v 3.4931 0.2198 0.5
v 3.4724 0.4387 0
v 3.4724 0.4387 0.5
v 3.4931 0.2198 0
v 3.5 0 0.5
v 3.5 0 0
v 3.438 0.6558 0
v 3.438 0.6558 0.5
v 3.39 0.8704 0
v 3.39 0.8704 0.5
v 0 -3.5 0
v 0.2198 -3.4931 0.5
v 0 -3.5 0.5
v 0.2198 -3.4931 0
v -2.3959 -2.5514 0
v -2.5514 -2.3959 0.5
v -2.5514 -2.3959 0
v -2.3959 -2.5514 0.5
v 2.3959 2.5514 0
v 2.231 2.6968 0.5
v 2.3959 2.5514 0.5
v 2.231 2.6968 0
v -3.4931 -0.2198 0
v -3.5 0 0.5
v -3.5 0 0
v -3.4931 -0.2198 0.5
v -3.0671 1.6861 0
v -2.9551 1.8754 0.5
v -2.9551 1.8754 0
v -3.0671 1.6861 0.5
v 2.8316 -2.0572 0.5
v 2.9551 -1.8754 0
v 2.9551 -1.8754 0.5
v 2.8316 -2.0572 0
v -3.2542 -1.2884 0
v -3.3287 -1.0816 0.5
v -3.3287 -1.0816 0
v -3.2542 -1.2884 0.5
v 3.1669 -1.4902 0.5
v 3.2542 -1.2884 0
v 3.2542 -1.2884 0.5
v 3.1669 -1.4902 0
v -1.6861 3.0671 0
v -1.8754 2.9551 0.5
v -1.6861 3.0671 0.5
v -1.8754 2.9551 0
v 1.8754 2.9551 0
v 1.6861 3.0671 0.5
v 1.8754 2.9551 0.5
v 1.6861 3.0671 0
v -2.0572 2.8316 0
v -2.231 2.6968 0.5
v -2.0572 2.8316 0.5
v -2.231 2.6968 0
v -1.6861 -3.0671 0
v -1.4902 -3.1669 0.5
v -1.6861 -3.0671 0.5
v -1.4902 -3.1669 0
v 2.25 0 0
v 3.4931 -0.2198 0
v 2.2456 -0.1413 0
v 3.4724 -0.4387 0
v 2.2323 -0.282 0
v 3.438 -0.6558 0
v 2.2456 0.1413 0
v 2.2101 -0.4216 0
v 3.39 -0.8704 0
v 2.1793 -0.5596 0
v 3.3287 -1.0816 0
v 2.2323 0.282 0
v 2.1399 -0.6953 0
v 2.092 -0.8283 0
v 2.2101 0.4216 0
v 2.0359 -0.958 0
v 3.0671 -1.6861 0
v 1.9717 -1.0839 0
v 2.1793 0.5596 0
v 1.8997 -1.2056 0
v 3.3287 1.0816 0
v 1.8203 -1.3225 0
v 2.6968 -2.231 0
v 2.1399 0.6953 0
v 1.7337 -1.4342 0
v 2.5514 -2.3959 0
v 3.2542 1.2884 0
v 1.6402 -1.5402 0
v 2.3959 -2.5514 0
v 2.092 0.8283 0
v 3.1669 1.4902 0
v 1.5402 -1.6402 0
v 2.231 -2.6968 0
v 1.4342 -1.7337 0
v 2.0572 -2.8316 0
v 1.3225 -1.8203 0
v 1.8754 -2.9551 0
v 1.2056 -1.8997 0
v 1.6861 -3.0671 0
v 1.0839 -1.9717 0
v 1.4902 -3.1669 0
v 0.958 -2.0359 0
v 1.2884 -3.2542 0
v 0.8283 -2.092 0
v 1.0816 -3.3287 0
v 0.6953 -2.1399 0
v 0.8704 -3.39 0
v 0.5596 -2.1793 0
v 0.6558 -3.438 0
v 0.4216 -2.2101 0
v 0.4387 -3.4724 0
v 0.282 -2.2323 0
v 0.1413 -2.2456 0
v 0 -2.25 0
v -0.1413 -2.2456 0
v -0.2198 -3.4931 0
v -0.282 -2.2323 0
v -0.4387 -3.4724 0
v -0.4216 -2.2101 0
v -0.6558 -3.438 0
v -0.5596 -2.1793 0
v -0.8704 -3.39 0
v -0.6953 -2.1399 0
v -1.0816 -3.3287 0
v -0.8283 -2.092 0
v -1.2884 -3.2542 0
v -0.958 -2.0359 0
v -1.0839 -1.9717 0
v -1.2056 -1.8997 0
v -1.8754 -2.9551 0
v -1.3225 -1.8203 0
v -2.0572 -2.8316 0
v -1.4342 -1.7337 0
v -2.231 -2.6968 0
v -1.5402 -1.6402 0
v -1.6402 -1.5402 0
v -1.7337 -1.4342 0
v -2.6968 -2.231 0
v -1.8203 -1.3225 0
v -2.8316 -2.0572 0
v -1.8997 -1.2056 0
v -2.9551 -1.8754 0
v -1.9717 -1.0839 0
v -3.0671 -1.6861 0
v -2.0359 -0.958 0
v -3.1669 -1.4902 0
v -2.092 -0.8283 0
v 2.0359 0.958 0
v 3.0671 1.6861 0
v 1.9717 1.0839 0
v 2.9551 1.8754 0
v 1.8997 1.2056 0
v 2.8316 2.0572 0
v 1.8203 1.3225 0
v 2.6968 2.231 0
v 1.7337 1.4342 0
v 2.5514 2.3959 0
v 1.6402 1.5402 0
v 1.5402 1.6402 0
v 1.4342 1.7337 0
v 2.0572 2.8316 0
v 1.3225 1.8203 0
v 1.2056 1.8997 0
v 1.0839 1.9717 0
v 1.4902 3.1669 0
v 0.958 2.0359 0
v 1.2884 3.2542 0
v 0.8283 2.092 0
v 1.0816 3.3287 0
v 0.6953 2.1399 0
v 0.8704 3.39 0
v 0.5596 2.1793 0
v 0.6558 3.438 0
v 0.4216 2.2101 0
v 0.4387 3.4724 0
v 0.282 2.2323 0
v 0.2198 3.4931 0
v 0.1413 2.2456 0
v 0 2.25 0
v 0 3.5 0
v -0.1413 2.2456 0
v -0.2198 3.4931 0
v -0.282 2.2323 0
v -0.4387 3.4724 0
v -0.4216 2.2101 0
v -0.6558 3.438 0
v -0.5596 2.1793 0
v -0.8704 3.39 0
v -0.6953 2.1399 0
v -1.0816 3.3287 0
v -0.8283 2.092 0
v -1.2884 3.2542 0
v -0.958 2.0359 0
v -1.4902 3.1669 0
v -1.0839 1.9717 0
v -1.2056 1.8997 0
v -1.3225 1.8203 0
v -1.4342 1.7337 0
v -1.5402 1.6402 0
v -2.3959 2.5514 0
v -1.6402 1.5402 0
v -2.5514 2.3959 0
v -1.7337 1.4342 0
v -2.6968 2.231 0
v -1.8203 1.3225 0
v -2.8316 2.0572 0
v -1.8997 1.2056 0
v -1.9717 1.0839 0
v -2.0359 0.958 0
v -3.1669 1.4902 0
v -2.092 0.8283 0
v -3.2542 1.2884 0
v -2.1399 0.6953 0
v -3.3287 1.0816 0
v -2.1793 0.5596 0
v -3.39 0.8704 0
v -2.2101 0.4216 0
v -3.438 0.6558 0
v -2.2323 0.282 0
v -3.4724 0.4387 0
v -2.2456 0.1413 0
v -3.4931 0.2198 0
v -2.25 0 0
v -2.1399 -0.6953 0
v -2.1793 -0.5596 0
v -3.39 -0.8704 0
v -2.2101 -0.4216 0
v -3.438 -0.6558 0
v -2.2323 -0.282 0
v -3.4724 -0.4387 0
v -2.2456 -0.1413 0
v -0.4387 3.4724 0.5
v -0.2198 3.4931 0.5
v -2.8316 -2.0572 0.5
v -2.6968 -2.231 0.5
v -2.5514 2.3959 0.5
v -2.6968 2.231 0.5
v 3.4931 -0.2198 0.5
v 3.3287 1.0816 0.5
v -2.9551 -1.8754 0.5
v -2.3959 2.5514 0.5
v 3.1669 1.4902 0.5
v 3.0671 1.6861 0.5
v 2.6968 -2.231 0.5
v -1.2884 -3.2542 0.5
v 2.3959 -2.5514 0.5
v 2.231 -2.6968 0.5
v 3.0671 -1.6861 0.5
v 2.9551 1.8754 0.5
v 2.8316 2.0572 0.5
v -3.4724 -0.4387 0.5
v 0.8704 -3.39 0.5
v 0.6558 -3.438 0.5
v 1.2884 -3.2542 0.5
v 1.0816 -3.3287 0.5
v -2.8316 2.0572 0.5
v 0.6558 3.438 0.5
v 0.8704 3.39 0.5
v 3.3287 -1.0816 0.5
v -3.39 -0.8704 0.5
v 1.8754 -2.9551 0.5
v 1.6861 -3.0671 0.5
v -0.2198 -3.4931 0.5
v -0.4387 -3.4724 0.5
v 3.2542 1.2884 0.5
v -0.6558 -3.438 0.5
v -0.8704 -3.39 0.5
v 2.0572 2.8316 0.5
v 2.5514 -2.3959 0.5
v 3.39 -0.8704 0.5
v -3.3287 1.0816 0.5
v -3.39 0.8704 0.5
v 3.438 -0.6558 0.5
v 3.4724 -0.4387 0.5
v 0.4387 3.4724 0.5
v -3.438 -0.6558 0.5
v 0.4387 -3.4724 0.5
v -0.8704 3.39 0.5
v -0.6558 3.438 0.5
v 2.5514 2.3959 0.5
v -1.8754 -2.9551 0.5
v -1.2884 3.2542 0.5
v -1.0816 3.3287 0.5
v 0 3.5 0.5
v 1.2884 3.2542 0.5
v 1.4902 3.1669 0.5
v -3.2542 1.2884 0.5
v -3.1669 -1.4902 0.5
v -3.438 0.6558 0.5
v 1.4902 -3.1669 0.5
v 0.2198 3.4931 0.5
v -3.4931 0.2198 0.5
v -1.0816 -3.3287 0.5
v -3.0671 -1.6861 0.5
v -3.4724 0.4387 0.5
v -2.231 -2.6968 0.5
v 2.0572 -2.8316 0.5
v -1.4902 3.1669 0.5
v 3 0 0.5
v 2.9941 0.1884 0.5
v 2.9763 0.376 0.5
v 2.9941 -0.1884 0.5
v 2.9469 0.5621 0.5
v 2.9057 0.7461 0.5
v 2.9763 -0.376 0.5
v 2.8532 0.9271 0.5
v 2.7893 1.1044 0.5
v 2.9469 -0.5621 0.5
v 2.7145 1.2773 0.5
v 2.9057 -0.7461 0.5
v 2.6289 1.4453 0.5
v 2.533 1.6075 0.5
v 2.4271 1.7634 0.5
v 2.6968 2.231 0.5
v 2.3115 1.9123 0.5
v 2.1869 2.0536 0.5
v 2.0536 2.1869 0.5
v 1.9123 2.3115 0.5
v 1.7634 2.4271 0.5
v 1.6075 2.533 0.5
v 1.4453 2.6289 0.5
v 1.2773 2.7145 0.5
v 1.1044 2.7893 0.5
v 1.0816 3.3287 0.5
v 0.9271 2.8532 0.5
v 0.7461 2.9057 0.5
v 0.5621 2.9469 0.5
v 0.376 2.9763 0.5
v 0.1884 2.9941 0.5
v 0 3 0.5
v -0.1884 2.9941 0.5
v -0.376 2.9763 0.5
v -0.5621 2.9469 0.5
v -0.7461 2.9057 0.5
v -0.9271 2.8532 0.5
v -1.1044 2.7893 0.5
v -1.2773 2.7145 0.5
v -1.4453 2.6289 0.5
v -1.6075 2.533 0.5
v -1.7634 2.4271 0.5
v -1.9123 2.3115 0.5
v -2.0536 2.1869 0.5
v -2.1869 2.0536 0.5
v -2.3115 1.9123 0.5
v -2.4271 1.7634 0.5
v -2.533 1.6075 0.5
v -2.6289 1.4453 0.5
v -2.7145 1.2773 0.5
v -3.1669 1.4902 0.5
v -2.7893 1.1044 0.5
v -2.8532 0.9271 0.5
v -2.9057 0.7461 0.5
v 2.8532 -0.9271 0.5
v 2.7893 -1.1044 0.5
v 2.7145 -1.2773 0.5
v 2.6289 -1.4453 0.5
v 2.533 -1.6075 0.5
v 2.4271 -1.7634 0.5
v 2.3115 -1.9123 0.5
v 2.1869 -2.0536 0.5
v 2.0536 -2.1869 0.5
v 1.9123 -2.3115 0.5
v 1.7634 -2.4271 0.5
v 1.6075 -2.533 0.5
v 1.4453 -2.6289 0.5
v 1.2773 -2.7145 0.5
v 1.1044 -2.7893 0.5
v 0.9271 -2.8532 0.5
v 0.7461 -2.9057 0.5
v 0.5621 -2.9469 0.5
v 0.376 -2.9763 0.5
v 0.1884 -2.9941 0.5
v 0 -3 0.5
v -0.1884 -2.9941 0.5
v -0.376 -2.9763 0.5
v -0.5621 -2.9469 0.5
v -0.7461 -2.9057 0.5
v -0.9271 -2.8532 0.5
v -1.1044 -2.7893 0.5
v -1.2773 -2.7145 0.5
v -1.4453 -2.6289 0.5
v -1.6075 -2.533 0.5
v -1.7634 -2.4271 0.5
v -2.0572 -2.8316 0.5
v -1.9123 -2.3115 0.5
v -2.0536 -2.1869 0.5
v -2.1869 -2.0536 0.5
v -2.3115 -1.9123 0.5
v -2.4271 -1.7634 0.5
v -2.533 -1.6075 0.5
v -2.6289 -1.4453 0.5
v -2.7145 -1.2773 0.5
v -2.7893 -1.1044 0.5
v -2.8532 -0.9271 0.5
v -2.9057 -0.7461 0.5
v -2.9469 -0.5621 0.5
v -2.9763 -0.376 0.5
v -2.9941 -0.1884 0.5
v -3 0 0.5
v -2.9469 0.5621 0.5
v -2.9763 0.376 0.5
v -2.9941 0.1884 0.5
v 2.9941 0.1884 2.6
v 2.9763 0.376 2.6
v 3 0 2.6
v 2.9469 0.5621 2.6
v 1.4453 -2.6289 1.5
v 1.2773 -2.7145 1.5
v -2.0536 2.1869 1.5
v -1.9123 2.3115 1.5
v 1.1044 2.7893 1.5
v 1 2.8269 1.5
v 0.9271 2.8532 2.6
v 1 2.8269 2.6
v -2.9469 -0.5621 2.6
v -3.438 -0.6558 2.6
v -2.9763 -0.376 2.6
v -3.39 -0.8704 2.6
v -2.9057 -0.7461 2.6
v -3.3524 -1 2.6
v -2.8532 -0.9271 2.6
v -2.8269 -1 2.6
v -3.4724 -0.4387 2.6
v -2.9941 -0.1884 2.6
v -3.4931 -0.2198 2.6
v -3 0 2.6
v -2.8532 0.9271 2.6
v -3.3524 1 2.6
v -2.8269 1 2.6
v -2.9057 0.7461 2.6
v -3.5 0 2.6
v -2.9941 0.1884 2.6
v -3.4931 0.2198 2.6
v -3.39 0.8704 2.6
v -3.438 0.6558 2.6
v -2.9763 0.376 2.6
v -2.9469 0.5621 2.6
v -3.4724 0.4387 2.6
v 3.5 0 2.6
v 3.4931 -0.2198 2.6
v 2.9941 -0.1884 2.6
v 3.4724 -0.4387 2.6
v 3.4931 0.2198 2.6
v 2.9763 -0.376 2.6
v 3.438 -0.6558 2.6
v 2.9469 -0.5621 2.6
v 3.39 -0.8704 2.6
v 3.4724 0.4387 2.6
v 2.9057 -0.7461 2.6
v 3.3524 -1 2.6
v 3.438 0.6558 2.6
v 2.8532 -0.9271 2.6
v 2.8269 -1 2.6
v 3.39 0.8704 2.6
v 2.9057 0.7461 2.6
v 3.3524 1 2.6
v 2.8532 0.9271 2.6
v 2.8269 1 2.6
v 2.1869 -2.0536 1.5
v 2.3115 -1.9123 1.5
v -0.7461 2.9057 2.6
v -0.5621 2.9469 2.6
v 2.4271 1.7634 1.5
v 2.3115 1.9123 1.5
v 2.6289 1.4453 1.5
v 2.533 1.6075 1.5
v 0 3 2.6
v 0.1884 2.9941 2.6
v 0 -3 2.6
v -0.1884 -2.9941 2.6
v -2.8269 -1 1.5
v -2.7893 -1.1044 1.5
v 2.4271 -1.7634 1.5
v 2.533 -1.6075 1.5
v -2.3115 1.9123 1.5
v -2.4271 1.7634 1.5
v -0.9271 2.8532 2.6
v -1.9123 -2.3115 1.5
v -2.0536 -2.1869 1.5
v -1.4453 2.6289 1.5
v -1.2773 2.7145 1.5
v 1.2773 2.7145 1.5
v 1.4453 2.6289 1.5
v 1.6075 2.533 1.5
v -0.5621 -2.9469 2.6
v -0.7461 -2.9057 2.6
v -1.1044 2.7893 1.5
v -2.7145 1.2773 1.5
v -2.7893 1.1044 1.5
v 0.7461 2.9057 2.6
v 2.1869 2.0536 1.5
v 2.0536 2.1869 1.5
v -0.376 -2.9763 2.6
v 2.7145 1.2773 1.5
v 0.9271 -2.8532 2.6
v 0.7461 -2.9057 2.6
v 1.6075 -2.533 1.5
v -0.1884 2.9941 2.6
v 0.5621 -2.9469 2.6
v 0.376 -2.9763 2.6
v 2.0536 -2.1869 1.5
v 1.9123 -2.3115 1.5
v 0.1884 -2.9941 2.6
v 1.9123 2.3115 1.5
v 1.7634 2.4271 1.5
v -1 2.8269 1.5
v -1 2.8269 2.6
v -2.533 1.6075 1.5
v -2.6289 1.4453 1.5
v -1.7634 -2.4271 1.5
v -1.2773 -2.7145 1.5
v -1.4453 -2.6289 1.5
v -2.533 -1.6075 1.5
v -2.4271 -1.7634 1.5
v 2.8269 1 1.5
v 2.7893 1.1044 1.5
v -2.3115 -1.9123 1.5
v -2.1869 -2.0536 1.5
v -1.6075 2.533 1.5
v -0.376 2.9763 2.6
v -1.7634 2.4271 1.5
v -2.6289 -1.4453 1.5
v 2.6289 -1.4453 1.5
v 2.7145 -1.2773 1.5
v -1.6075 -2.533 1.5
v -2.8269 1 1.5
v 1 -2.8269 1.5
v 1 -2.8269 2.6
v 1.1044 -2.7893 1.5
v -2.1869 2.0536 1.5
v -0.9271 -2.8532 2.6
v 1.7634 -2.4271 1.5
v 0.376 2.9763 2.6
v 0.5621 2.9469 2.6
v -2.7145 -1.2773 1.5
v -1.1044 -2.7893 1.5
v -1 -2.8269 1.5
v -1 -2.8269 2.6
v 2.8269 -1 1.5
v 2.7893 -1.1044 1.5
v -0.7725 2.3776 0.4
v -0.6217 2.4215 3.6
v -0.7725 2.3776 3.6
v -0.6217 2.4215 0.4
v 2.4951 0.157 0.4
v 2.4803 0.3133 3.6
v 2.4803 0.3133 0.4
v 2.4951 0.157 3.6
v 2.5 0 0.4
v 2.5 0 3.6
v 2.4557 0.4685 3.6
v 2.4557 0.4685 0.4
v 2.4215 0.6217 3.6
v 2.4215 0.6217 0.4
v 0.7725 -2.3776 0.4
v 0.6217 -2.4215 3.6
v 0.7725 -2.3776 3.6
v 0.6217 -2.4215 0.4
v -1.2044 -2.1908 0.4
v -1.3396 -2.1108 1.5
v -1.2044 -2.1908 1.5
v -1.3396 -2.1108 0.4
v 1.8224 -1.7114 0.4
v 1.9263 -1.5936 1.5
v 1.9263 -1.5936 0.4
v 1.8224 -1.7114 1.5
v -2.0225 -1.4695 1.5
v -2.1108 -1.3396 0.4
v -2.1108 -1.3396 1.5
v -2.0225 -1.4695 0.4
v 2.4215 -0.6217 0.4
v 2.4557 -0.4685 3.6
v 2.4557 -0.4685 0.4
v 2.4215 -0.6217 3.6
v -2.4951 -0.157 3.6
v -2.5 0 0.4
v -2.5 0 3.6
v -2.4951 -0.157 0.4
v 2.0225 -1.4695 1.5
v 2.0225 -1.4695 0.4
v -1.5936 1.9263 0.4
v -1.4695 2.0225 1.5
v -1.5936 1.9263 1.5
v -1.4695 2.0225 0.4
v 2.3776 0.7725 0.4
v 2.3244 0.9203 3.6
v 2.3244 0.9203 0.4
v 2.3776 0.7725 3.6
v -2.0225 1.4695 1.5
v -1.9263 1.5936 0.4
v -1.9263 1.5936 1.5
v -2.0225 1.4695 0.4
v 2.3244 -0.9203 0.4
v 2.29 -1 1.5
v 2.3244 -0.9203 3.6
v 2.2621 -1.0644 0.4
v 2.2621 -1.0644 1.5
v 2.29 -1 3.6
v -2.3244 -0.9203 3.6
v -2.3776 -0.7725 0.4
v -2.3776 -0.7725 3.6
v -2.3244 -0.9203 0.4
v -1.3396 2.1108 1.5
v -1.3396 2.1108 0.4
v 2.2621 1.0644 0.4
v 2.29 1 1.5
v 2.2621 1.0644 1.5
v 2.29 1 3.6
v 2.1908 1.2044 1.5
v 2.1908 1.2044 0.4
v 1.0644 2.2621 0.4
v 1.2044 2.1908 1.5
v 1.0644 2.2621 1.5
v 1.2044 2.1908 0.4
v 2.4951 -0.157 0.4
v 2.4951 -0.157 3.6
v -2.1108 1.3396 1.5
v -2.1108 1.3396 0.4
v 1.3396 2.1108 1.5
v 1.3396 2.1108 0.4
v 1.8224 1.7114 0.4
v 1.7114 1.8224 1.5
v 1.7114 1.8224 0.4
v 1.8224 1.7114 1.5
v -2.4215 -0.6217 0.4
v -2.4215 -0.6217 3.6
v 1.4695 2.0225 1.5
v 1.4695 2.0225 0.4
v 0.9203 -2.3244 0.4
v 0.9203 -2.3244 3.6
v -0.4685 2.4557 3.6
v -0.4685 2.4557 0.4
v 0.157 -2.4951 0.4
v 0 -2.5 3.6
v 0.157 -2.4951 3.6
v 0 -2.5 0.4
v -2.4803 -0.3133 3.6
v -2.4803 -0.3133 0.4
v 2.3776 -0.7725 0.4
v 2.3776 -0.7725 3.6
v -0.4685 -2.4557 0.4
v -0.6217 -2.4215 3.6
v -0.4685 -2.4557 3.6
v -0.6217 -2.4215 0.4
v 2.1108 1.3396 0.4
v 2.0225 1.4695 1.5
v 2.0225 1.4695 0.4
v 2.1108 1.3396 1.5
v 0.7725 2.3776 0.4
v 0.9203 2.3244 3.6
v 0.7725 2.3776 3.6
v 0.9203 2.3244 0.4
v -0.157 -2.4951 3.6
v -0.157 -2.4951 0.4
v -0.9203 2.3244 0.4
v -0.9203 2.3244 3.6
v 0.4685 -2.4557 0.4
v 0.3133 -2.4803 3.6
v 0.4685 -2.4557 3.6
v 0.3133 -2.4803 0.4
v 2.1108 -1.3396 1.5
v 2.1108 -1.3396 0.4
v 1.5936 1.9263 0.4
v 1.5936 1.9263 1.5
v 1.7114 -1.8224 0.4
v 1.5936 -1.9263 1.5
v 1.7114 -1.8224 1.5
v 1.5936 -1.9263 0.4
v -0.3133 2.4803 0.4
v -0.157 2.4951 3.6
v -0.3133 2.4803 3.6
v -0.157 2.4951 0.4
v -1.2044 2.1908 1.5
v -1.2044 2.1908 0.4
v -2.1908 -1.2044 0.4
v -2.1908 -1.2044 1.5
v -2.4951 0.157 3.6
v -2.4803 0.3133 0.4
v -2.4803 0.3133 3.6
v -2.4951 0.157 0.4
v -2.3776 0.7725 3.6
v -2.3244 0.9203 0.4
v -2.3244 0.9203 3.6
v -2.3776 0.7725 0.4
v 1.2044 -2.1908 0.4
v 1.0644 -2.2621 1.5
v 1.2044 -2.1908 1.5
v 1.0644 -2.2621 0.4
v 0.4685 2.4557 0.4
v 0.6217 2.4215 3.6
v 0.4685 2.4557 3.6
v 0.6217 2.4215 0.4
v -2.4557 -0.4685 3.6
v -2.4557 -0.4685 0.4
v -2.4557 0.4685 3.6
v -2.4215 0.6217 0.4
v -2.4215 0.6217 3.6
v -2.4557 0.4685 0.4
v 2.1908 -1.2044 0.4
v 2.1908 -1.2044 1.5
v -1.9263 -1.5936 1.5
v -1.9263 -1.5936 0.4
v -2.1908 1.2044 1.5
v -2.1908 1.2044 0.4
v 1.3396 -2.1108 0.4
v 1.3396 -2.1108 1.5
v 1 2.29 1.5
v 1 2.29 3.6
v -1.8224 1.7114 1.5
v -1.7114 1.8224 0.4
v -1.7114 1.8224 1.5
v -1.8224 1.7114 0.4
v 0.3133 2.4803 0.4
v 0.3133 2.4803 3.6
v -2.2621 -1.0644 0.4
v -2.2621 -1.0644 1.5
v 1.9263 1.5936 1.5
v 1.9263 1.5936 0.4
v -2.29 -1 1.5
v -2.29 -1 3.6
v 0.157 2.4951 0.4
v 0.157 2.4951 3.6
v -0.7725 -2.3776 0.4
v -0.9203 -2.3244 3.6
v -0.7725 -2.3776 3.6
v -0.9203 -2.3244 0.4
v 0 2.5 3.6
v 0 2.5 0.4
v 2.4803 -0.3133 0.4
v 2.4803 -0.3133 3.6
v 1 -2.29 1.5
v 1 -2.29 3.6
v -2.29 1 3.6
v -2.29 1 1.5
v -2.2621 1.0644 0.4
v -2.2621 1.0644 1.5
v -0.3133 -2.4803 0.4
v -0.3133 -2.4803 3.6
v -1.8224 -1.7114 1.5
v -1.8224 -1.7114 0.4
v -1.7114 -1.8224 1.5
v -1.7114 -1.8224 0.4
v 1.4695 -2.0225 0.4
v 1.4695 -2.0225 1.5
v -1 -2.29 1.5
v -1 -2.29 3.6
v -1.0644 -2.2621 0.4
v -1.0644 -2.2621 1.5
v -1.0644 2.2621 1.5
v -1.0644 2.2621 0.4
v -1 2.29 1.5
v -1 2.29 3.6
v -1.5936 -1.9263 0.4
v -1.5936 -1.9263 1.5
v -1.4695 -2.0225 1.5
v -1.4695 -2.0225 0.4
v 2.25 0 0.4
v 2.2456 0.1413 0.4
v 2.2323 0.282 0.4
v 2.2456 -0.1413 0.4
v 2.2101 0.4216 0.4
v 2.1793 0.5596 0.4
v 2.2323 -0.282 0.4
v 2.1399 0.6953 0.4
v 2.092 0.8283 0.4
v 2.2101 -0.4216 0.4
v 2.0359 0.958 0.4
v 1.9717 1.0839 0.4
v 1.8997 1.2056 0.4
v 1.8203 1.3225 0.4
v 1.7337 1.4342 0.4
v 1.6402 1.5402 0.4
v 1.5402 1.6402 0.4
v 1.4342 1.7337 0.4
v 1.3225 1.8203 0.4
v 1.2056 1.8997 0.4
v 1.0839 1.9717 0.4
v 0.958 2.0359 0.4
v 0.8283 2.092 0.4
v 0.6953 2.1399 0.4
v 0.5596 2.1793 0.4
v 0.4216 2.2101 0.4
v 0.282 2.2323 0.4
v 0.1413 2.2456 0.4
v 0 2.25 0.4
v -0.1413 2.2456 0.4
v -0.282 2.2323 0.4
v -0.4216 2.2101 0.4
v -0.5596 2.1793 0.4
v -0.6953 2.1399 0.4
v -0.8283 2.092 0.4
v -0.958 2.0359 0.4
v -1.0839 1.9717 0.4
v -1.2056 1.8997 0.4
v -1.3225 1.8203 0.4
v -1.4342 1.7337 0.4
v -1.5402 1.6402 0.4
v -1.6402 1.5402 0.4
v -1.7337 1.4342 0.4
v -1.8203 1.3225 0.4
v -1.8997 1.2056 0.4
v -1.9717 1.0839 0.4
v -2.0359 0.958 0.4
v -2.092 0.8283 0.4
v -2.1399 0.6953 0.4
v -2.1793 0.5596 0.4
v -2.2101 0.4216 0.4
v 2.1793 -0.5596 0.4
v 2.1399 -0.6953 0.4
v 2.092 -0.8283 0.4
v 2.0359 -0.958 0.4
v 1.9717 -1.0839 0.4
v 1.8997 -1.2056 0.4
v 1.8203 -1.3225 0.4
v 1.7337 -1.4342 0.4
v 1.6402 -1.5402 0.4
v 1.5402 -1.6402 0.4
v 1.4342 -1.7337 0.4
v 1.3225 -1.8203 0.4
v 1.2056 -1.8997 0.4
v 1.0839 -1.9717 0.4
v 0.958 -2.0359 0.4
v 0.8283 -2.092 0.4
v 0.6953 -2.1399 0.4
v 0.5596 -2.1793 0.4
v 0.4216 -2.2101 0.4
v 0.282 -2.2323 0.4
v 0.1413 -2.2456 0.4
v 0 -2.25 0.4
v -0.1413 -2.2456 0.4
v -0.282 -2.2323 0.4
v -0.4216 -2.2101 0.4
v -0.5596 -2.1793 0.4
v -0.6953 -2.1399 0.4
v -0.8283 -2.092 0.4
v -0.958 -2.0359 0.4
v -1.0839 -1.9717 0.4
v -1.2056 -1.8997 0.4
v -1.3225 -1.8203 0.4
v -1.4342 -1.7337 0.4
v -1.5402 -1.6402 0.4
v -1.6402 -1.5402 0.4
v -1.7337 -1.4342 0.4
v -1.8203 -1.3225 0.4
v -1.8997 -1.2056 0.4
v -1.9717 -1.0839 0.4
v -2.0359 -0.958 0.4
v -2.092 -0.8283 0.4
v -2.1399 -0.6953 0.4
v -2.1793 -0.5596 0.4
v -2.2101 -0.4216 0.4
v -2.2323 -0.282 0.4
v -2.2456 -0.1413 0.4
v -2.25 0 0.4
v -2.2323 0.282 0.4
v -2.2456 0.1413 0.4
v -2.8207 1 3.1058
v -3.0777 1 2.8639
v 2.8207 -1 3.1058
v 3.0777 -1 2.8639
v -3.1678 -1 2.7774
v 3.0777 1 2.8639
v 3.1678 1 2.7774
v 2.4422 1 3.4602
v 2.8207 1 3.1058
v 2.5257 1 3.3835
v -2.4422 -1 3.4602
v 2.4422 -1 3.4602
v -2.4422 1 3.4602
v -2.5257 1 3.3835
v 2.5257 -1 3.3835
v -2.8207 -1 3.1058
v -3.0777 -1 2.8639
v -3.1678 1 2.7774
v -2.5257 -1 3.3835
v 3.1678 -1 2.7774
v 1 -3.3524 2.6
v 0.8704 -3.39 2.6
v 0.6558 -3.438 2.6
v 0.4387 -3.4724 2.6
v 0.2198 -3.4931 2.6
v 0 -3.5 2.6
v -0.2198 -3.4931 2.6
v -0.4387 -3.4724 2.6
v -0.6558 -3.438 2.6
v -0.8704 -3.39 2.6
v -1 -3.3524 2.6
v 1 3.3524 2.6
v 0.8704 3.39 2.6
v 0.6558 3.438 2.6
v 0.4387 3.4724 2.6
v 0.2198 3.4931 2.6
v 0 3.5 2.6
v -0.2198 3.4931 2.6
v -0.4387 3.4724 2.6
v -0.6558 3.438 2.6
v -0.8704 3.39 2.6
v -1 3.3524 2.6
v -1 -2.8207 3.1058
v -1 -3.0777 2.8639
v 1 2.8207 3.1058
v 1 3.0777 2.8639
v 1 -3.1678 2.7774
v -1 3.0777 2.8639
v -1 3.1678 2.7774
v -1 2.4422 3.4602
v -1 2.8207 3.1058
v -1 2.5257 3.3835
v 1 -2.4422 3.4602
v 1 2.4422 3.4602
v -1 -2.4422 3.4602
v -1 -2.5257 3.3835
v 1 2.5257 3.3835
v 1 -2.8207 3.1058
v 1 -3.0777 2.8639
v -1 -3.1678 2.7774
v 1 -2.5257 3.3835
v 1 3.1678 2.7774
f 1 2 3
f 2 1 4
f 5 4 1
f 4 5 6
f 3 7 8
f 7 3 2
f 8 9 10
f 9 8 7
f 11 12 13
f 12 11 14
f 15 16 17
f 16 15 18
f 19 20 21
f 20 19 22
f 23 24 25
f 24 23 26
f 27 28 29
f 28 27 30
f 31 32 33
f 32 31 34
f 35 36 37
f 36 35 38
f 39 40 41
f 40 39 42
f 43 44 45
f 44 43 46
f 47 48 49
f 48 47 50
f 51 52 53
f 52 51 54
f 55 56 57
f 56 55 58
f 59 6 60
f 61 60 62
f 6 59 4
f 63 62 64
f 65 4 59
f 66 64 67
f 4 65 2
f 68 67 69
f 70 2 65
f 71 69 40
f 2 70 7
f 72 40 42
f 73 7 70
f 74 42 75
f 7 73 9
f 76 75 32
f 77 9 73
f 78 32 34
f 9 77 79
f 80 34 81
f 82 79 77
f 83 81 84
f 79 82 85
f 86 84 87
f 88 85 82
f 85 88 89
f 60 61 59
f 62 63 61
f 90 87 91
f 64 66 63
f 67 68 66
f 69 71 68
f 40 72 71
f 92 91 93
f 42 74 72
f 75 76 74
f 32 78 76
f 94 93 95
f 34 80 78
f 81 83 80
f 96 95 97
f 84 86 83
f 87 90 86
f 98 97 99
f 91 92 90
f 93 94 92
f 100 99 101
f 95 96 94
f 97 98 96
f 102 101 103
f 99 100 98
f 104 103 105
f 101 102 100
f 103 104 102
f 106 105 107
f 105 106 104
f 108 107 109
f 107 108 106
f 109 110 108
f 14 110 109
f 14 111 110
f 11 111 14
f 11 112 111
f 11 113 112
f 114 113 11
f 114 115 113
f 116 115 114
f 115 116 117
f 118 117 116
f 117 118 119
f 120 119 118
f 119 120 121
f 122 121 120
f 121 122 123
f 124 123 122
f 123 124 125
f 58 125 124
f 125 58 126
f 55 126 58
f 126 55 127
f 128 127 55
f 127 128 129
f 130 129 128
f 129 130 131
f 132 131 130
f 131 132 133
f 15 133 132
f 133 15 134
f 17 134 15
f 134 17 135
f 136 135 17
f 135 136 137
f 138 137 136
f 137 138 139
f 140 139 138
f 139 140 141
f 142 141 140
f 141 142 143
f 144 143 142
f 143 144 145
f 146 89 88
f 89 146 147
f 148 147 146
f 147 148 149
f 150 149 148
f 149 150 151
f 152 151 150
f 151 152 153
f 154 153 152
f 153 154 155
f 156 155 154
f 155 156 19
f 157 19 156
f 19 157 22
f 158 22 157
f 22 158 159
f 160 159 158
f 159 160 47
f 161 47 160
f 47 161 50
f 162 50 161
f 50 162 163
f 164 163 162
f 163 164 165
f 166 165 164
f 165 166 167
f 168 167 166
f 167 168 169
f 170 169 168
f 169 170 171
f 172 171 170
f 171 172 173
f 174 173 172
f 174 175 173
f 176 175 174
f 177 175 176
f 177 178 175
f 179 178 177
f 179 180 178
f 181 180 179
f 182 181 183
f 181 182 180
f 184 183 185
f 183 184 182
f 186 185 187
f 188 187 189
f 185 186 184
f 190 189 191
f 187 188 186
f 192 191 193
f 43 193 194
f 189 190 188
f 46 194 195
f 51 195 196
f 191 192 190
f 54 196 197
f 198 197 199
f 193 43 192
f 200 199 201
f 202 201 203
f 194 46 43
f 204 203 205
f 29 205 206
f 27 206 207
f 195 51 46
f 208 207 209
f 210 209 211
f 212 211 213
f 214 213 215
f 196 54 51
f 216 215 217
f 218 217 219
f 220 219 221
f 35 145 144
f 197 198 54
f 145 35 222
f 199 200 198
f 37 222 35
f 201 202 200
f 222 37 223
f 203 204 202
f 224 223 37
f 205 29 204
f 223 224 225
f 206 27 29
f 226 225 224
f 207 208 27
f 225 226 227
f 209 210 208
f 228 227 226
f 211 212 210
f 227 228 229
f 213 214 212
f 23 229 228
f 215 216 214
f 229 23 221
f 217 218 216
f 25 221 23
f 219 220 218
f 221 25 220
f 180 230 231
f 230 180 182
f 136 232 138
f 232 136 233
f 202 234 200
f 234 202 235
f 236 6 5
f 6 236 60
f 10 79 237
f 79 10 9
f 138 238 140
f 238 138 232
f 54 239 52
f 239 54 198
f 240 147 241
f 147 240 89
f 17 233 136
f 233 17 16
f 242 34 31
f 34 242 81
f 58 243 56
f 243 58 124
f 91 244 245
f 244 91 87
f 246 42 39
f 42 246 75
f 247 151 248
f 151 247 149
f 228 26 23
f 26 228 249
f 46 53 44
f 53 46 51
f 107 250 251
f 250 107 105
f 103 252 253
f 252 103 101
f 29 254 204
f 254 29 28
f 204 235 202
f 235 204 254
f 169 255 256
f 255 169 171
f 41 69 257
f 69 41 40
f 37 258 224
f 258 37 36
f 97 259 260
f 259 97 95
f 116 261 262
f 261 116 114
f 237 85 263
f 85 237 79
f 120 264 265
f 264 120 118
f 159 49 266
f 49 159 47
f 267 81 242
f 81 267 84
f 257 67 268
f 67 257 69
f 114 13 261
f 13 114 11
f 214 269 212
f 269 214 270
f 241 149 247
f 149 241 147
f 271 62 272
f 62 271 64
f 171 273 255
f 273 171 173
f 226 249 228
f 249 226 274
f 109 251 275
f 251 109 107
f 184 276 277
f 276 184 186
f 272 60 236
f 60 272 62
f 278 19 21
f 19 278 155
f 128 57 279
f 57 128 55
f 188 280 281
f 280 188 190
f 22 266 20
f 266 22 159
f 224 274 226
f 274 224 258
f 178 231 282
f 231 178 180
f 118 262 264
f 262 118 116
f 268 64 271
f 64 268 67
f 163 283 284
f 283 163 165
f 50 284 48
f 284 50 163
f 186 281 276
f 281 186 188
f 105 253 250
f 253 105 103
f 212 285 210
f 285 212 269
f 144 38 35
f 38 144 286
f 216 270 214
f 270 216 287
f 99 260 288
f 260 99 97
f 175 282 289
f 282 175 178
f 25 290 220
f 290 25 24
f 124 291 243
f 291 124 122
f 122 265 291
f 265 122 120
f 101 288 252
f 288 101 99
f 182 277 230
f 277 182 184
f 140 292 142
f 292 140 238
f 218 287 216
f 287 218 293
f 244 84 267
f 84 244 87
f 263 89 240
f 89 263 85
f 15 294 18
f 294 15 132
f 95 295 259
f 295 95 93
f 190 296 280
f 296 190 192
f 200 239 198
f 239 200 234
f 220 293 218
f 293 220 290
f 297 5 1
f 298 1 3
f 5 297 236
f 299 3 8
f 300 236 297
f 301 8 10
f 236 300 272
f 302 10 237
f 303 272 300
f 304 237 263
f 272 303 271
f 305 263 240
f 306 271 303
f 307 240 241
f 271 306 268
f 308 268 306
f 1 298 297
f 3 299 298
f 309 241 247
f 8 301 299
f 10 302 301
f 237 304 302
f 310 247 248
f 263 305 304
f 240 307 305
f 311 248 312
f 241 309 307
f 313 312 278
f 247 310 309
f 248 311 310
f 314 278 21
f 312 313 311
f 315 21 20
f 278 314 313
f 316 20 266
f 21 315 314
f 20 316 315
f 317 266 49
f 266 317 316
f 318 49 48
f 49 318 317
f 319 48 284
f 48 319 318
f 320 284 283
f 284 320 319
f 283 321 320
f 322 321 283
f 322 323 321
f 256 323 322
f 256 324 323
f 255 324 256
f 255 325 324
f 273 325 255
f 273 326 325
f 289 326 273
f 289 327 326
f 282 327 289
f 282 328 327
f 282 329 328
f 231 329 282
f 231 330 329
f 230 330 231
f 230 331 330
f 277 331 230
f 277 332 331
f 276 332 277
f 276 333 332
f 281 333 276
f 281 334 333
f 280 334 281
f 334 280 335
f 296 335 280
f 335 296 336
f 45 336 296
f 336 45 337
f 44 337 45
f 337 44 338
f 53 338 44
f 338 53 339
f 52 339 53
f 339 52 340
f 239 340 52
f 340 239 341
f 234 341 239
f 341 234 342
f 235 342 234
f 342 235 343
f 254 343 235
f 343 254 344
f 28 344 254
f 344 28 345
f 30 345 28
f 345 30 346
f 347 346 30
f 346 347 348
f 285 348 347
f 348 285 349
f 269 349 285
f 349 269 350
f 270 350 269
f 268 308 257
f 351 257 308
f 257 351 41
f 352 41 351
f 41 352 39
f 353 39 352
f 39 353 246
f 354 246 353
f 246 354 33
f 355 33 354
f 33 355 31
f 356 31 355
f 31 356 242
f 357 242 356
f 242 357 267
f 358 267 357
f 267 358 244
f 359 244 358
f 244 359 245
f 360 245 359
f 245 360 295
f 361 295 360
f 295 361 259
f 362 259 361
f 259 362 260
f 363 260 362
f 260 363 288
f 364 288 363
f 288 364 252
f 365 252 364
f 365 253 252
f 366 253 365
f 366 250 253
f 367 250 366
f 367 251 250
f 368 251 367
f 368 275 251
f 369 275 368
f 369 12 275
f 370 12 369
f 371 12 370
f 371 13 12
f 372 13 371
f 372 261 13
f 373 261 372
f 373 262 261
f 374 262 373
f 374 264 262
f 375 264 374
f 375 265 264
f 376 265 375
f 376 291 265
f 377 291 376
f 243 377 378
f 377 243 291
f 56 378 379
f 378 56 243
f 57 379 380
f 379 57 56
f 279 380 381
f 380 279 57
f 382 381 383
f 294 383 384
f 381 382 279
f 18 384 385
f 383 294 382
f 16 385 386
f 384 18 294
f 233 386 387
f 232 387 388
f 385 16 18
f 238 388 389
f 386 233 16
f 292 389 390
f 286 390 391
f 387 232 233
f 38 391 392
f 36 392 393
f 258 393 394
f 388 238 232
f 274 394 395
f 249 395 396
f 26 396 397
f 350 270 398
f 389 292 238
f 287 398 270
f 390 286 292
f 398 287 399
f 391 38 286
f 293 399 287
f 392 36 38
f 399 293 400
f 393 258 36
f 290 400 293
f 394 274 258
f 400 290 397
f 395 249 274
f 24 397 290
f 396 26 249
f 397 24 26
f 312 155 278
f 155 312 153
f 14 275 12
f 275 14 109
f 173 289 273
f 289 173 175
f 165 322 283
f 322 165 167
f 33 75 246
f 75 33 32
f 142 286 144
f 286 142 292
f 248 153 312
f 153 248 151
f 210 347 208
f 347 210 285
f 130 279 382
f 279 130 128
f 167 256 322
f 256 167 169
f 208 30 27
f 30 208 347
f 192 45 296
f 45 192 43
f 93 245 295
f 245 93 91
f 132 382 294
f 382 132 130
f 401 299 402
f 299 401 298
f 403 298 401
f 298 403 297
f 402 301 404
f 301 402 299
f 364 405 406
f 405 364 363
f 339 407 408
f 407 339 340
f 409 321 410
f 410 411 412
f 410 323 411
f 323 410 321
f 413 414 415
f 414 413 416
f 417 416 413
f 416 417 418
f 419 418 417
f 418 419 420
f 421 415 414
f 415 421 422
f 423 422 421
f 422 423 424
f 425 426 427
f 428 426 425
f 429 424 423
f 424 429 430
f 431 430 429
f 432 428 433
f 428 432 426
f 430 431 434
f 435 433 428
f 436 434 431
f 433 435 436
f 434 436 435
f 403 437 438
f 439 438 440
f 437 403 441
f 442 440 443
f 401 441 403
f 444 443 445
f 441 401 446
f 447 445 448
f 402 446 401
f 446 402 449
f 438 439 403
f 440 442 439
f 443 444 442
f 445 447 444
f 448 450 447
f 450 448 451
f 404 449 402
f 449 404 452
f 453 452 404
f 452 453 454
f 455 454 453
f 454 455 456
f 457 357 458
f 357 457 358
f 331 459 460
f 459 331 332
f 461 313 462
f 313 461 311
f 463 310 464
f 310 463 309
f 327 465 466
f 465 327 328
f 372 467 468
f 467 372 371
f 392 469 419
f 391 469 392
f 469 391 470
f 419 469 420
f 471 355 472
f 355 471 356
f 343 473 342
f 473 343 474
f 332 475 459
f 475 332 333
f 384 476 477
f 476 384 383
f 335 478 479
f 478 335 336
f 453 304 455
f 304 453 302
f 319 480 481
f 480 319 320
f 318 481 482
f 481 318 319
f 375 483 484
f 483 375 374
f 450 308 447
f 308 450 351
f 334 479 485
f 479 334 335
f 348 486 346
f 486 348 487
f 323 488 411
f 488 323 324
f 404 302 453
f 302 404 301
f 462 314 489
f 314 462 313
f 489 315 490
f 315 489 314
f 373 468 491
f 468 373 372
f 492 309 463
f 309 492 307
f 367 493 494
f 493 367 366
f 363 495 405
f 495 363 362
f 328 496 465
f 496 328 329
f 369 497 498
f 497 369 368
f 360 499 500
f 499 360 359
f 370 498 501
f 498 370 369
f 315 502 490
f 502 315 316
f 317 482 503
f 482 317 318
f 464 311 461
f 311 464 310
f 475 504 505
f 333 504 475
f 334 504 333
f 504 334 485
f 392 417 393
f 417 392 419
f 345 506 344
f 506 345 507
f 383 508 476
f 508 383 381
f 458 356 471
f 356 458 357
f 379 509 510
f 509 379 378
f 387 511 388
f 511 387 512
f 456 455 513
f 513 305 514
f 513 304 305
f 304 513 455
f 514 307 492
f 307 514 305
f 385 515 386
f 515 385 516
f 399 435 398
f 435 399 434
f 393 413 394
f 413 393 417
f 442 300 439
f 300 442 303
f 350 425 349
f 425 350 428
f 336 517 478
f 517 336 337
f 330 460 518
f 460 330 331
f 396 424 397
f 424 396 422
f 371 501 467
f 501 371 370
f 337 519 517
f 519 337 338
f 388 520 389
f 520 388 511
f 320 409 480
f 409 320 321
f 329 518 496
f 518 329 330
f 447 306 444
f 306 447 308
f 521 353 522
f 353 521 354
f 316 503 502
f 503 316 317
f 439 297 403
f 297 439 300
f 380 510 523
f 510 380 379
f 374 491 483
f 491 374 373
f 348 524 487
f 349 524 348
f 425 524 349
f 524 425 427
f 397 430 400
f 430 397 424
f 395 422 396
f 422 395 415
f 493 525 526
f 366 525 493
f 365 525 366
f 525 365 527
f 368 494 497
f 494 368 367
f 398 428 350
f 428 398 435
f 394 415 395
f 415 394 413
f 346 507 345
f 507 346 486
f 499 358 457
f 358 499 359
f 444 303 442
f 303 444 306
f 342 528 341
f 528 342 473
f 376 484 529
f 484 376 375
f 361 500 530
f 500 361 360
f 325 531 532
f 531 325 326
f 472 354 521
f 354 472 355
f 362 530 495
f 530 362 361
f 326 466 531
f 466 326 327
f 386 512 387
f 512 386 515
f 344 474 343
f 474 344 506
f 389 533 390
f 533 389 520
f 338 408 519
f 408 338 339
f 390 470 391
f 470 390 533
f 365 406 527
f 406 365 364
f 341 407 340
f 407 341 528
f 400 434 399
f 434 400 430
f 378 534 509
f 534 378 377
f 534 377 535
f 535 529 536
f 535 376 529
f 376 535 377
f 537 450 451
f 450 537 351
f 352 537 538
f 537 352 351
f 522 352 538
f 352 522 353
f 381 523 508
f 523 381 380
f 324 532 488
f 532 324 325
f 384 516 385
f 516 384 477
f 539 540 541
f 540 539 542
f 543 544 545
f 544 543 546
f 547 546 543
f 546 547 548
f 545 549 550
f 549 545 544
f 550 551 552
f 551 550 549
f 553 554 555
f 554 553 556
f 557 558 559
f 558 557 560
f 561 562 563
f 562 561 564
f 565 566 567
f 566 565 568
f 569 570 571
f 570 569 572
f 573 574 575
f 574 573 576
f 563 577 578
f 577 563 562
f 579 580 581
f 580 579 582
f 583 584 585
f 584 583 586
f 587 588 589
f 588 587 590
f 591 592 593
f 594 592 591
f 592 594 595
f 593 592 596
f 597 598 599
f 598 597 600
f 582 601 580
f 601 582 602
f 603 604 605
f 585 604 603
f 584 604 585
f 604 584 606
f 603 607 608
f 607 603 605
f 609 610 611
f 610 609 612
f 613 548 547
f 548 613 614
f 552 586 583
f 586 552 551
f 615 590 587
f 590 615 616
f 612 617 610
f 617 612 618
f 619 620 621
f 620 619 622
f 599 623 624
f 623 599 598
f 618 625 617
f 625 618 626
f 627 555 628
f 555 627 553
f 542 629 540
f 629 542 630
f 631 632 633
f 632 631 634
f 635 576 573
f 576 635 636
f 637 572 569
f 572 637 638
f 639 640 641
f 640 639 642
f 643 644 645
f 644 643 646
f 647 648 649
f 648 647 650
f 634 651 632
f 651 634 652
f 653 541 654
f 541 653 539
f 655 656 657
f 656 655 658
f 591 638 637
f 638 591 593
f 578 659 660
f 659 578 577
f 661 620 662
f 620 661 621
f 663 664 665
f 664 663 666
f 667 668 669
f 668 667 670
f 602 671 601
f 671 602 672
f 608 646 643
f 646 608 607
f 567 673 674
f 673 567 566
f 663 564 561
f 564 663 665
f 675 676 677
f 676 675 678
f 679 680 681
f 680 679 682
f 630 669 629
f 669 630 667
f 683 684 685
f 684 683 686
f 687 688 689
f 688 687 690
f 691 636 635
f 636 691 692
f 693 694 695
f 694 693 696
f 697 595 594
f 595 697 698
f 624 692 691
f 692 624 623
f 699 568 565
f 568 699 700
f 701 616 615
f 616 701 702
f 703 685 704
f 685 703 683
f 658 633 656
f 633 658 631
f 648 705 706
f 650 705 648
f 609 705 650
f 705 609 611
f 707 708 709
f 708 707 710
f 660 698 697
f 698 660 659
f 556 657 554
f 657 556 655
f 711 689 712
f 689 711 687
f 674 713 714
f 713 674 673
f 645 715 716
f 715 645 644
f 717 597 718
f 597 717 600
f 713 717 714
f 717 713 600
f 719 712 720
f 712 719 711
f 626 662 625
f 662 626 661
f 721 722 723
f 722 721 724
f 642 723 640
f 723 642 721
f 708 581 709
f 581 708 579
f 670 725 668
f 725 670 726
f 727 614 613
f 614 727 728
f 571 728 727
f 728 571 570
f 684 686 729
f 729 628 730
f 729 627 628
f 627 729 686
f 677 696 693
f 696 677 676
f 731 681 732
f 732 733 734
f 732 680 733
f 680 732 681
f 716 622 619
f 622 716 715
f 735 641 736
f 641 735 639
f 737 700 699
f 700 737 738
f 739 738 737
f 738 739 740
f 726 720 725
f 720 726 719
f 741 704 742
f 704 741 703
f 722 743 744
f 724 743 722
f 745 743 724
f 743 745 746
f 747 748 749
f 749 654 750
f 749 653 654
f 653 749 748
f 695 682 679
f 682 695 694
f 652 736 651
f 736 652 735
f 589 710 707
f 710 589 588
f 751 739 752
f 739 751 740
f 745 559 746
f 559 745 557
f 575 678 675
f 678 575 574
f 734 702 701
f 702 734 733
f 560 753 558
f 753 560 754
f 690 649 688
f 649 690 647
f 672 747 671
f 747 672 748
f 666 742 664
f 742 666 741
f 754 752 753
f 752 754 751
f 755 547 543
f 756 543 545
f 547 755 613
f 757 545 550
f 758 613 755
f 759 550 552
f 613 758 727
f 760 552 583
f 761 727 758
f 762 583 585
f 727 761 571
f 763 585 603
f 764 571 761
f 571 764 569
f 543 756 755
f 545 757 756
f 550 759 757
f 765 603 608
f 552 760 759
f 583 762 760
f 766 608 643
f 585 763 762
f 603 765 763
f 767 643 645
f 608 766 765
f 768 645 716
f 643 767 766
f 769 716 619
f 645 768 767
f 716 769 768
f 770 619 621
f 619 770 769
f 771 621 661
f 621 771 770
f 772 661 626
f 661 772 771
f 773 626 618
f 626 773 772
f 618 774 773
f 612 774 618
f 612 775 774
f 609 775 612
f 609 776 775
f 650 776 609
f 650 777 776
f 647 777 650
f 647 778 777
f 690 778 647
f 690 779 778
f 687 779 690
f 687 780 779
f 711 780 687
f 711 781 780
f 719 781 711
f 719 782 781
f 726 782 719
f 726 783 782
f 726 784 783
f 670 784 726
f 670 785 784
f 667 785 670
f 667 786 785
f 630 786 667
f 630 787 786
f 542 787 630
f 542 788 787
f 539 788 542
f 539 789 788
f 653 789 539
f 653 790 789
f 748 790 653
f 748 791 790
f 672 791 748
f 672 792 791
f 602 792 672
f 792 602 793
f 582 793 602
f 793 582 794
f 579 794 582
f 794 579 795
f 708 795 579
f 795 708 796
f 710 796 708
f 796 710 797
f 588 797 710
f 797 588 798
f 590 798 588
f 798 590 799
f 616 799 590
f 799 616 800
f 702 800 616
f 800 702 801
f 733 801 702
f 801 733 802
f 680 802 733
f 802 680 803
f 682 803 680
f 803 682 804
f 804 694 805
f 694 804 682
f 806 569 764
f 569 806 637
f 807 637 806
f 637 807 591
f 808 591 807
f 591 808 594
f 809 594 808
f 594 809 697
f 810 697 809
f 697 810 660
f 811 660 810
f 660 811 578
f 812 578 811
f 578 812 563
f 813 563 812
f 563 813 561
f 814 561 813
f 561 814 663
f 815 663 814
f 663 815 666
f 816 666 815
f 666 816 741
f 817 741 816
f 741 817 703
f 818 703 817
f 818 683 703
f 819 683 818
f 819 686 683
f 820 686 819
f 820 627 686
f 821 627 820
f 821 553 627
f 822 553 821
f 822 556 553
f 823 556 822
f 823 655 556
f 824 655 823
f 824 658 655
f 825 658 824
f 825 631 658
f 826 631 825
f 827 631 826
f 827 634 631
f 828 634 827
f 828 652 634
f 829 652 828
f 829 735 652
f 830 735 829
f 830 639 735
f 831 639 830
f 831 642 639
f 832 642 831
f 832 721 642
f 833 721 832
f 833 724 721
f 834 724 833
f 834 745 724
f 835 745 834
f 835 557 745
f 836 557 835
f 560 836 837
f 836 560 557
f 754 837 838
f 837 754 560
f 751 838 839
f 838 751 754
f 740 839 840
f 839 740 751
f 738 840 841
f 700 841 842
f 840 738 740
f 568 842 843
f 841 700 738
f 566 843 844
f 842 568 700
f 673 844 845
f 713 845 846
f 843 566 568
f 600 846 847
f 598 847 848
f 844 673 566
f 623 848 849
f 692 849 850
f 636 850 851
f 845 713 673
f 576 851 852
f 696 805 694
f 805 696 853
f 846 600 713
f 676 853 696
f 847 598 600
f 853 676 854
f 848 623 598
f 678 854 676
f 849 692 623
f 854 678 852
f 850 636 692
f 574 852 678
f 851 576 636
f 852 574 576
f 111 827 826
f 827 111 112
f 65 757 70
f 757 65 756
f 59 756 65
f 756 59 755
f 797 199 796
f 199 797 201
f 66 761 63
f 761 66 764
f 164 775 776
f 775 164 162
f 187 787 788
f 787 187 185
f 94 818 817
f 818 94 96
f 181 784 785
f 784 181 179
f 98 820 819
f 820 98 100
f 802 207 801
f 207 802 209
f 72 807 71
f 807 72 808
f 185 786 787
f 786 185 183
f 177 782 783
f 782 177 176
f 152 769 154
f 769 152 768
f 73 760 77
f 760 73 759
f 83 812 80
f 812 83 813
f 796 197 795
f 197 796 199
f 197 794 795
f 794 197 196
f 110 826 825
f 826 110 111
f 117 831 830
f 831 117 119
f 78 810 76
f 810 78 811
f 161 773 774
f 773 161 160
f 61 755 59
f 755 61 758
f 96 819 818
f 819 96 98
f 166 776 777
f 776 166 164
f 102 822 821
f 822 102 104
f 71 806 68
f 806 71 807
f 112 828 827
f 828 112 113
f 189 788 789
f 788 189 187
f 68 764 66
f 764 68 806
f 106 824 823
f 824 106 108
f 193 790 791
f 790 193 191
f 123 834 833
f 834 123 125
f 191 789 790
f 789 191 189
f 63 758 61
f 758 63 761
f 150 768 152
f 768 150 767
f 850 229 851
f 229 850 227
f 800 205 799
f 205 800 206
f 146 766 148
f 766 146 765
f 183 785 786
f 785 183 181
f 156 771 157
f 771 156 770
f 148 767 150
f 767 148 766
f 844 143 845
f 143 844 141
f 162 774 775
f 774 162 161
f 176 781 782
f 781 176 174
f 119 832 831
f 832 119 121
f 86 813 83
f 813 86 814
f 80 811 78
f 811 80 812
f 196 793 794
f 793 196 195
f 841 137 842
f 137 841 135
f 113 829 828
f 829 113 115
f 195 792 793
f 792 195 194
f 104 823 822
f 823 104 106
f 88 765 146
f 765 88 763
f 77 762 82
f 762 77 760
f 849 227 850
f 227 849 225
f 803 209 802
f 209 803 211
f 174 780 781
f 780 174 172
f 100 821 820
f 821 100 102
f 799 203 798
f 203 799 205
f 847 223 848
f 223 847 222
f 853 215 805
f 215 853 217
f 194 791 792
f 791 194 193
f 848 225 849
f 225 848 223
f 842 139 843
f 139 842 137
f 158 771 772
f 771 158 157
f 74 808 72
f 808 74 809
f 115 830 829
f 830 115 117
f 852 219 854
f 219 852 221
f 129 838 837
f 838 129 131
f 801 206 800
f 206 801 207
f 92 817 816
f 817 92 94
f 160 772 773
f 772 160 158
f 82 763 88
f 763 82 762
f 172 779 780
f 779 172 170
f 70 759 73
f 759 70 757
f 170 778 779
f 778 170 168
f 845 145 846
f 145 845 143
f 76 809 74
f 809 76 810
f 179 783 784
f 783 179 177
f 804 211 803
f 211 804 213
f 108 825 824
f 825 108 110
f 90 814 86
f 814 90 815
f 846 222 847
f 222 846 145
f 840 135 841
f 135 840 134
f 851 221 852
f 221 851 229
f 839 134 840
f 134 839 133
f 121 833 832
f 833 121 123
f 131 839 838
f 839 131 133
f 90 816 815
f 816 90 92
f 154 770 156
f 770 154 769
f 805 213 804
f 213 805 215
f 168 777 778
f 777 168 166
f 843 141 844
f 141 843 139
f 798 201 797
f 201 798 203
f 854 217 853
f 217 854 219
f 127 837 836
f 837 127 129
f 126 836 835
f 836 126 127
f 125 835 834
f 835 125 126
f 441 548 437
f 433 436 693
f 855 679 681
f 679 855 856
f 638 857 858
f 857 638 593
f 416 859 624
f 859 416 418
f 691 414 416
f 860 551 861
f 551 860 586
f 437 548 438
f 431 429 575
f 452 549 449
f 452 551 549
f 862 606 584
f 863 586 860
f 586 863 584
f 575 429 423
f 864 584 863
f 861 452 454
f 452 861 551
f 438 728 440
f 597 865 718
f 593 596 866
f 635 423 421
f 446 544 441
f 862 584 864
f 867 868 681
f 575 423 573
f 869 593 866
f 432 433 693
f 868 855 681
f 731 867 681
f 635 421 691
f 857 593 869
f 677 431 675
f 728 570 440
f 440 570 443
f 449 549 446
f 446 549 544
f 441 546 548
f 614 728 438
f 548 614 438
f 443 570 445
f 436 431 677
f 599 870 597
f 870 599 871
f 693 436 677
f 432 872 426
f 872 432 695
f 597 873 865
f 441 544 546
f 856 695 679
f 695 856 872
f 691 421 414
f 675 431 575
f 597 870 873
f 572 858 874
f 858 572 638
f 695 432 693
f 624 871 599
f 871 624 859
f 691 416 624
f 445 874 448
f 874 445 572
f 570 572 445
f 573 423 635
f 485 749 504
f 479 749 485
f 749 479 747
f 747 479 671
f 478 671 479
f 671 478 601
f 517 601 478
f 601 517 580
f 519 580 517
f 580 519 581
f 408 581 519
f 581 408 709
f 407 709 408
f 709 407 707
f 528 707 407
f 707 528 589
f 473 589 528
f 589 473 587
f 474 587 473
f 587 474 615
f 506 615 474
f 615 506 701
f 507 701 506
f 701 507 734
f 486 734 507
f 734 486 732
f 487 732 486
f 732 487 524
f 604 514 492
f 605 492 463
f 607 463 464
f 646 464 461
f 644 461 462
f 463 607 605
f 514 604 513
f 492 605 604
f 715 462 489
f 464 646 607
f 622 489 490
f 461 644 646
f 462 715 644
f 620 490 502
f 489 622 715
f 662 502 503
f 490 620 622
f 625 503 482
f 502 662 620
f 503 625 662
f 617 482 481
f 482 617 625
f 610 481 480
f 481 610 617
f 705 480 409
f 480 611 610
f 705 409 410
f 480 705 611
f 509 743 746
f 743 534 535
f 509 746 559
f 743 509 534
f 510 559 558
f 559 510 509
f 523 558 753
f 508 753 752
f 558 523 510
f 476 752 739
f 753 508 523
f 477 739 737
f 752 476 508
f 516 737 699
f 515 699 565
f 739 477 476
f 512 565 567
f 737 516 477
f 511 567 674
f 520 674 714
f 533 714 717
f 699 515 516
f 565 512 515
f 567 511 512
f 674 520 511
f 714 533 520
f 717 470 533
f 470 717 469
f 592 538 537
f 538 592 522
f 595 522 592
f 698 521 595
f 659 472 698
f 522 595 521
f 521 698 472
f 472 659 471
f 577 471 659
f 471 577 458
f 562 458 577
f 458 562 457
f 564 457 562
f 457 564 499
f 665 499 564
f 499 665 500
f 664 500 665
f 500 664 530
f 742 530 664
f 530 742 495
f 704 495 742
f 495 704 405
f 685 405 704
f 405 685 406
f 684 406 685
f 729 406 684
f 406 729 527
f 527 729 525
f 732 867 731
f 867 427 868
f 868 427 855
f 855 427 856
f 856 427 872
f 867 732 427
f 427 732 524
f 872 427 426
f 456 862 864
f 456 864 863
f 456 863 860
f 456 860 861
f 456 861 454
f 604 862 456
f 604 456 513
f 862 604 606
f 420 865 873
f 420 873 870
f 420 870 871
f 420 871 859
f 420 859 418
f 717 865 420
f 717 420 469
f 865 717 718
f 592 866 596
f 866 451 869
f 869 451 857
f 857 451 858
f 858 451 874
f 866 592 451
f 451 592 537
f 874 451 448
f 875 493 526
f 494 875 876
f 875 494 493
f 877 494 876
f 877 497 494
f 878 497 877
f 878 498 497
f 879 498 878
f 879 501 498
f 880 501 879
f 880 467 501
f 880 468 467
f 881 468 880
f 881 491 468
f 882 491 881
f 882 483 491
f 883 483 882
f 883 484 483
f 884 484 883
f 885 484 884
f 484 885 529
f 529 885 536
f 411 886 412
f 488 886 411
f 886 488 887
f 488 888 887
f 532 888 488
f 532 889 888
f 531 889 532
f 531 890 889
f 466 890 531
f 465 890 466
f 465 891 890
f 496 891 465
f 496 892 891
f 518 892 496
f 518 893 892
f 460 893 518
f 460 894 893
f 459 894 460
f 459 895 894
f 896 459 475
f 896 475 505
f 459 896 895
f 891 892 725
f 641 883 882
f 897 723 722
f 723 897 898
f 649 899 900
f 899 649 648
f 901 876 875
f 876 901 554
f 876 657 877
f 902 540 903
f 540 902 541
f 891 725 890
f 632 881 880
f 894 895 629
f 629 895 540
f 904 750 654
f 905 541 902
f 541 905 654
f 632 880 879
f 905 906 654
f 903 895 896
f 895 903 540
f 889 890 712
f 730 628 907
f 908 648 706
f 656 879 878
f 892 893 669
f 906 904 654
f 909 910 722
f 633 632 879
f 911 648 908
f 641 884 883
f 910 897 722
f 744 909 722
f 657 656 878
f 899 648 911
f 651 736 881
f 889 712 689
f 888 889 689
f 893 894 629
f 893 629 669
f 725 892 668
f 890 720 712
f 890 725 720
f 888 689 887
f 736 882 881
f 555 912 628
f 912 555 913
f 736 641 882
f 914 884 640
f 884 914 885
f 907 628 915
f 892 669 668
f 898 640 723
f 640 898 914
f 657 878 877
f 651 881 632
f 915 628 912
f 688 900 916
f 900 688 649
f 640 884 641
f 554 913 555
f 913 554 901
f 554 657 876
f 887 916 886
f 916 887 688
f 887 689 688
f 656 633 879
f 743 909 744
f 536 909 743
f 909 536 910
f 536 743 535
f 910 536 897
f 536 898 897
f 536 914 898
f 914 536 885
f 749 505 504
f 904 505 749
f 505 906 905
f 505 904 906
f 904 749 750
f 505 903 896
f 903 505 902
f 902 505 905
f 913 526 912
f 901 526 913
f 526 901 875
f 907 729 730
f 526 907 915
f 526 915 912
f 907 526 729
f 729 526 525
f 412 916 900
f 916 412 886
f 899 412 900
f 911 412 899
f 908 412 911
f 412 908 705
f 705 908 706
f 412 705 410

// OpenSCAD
/*
WS2811 LED Mount

Actual Measurements:

Diameter: 0.475 inches
Diameter with ridge clip: 0.5 inches
Thickness of wood: 0.125 inches

*/

// NOTE numbers are in 10ths of inches!

// The size of the whole to fit the LED into. 
InnerDiameter = 5;
InnerRadius = InnerDiameter / 2;

// The width of wood that this is set into.
FixtureThickness = 2.1;


// The width of the lip on the from of the cylinder
FrontLipRadiusSize = 1;
FrontLipRadius = InnerRadius + FrontLipRadiusSize;
FrontLipThickness = 0.5;

// Thickness of the walls
Thickness = 0.5;

// Depth of the ridge radius
RidgeRadius = 0.25;
// Width of the ridge
RidgeWidth = 0.4;
// How far up the cylinder the ridge is.
RidgeInset = 0;

// The triangle clip at the top
ClipWidth = 0.5;
ClipHeight = 1;

CutoutOffset = 1.5;
CutoutWidth = 2;

$fn = 100;

module thing() {
difference() {
    
    union() {
        translate([0, 0, 0])
        cylinder(h = FrontLipThickness, r1 = FrontLipRadius, r2 = FrontLipRadius, center = false);
    
        translate([0, 0, 0])
        cylinder(h = FixtureThickness + FrontLipThickness, r1 = InnerRadius + Thickness, r2 = InnerRadius + Thickness, center = false);
    
    }
    
    translate([0, 0, 0])
    cylinder(h = 1000, r1 = InnerRadius, r2 = InnerRadius, center = false);
    
}

difference() {
    translate([0, 0, RidgeInset])
    cylinder(h = RidgeWidth, r1 = InnerRadius , r2 = InnerRadius, center = false);
    
  translate([0, 0, RidgeInset])
cylinder(h = 1000, r1 = InnerRadius - RidgeRadius, r2 = InnerRadius - RidgeRadius, center = false);

}



difference() {
    translate([0, 0,  FixtureThickness + FrontLipThickness])
    cylinder(h = ClipHeight, r1 = InnerRadius + Thickness + ClipWidth, r2 = InnerRadius, center = false);
    
  translate([0, 0,  FixtureThickness + FrontLipThickness])
    cylinder(h = ClipHeight, r1 = InnerRadius, r2 = InnerRadius, center = false);

}
}

module twoprong() {
difference() {
    thing();
    
translate([-10, CutoutWidth / 2, CutoutOffset])
        cube([20, 20, 10]);
    
    translate([-10, -20 - CutoutWidth / 2, CutoutOffset])
        cube([20, 20, 10]);
}
}

union() {
    twoprong();
    rotate(90)
    twoprong();
}

    
